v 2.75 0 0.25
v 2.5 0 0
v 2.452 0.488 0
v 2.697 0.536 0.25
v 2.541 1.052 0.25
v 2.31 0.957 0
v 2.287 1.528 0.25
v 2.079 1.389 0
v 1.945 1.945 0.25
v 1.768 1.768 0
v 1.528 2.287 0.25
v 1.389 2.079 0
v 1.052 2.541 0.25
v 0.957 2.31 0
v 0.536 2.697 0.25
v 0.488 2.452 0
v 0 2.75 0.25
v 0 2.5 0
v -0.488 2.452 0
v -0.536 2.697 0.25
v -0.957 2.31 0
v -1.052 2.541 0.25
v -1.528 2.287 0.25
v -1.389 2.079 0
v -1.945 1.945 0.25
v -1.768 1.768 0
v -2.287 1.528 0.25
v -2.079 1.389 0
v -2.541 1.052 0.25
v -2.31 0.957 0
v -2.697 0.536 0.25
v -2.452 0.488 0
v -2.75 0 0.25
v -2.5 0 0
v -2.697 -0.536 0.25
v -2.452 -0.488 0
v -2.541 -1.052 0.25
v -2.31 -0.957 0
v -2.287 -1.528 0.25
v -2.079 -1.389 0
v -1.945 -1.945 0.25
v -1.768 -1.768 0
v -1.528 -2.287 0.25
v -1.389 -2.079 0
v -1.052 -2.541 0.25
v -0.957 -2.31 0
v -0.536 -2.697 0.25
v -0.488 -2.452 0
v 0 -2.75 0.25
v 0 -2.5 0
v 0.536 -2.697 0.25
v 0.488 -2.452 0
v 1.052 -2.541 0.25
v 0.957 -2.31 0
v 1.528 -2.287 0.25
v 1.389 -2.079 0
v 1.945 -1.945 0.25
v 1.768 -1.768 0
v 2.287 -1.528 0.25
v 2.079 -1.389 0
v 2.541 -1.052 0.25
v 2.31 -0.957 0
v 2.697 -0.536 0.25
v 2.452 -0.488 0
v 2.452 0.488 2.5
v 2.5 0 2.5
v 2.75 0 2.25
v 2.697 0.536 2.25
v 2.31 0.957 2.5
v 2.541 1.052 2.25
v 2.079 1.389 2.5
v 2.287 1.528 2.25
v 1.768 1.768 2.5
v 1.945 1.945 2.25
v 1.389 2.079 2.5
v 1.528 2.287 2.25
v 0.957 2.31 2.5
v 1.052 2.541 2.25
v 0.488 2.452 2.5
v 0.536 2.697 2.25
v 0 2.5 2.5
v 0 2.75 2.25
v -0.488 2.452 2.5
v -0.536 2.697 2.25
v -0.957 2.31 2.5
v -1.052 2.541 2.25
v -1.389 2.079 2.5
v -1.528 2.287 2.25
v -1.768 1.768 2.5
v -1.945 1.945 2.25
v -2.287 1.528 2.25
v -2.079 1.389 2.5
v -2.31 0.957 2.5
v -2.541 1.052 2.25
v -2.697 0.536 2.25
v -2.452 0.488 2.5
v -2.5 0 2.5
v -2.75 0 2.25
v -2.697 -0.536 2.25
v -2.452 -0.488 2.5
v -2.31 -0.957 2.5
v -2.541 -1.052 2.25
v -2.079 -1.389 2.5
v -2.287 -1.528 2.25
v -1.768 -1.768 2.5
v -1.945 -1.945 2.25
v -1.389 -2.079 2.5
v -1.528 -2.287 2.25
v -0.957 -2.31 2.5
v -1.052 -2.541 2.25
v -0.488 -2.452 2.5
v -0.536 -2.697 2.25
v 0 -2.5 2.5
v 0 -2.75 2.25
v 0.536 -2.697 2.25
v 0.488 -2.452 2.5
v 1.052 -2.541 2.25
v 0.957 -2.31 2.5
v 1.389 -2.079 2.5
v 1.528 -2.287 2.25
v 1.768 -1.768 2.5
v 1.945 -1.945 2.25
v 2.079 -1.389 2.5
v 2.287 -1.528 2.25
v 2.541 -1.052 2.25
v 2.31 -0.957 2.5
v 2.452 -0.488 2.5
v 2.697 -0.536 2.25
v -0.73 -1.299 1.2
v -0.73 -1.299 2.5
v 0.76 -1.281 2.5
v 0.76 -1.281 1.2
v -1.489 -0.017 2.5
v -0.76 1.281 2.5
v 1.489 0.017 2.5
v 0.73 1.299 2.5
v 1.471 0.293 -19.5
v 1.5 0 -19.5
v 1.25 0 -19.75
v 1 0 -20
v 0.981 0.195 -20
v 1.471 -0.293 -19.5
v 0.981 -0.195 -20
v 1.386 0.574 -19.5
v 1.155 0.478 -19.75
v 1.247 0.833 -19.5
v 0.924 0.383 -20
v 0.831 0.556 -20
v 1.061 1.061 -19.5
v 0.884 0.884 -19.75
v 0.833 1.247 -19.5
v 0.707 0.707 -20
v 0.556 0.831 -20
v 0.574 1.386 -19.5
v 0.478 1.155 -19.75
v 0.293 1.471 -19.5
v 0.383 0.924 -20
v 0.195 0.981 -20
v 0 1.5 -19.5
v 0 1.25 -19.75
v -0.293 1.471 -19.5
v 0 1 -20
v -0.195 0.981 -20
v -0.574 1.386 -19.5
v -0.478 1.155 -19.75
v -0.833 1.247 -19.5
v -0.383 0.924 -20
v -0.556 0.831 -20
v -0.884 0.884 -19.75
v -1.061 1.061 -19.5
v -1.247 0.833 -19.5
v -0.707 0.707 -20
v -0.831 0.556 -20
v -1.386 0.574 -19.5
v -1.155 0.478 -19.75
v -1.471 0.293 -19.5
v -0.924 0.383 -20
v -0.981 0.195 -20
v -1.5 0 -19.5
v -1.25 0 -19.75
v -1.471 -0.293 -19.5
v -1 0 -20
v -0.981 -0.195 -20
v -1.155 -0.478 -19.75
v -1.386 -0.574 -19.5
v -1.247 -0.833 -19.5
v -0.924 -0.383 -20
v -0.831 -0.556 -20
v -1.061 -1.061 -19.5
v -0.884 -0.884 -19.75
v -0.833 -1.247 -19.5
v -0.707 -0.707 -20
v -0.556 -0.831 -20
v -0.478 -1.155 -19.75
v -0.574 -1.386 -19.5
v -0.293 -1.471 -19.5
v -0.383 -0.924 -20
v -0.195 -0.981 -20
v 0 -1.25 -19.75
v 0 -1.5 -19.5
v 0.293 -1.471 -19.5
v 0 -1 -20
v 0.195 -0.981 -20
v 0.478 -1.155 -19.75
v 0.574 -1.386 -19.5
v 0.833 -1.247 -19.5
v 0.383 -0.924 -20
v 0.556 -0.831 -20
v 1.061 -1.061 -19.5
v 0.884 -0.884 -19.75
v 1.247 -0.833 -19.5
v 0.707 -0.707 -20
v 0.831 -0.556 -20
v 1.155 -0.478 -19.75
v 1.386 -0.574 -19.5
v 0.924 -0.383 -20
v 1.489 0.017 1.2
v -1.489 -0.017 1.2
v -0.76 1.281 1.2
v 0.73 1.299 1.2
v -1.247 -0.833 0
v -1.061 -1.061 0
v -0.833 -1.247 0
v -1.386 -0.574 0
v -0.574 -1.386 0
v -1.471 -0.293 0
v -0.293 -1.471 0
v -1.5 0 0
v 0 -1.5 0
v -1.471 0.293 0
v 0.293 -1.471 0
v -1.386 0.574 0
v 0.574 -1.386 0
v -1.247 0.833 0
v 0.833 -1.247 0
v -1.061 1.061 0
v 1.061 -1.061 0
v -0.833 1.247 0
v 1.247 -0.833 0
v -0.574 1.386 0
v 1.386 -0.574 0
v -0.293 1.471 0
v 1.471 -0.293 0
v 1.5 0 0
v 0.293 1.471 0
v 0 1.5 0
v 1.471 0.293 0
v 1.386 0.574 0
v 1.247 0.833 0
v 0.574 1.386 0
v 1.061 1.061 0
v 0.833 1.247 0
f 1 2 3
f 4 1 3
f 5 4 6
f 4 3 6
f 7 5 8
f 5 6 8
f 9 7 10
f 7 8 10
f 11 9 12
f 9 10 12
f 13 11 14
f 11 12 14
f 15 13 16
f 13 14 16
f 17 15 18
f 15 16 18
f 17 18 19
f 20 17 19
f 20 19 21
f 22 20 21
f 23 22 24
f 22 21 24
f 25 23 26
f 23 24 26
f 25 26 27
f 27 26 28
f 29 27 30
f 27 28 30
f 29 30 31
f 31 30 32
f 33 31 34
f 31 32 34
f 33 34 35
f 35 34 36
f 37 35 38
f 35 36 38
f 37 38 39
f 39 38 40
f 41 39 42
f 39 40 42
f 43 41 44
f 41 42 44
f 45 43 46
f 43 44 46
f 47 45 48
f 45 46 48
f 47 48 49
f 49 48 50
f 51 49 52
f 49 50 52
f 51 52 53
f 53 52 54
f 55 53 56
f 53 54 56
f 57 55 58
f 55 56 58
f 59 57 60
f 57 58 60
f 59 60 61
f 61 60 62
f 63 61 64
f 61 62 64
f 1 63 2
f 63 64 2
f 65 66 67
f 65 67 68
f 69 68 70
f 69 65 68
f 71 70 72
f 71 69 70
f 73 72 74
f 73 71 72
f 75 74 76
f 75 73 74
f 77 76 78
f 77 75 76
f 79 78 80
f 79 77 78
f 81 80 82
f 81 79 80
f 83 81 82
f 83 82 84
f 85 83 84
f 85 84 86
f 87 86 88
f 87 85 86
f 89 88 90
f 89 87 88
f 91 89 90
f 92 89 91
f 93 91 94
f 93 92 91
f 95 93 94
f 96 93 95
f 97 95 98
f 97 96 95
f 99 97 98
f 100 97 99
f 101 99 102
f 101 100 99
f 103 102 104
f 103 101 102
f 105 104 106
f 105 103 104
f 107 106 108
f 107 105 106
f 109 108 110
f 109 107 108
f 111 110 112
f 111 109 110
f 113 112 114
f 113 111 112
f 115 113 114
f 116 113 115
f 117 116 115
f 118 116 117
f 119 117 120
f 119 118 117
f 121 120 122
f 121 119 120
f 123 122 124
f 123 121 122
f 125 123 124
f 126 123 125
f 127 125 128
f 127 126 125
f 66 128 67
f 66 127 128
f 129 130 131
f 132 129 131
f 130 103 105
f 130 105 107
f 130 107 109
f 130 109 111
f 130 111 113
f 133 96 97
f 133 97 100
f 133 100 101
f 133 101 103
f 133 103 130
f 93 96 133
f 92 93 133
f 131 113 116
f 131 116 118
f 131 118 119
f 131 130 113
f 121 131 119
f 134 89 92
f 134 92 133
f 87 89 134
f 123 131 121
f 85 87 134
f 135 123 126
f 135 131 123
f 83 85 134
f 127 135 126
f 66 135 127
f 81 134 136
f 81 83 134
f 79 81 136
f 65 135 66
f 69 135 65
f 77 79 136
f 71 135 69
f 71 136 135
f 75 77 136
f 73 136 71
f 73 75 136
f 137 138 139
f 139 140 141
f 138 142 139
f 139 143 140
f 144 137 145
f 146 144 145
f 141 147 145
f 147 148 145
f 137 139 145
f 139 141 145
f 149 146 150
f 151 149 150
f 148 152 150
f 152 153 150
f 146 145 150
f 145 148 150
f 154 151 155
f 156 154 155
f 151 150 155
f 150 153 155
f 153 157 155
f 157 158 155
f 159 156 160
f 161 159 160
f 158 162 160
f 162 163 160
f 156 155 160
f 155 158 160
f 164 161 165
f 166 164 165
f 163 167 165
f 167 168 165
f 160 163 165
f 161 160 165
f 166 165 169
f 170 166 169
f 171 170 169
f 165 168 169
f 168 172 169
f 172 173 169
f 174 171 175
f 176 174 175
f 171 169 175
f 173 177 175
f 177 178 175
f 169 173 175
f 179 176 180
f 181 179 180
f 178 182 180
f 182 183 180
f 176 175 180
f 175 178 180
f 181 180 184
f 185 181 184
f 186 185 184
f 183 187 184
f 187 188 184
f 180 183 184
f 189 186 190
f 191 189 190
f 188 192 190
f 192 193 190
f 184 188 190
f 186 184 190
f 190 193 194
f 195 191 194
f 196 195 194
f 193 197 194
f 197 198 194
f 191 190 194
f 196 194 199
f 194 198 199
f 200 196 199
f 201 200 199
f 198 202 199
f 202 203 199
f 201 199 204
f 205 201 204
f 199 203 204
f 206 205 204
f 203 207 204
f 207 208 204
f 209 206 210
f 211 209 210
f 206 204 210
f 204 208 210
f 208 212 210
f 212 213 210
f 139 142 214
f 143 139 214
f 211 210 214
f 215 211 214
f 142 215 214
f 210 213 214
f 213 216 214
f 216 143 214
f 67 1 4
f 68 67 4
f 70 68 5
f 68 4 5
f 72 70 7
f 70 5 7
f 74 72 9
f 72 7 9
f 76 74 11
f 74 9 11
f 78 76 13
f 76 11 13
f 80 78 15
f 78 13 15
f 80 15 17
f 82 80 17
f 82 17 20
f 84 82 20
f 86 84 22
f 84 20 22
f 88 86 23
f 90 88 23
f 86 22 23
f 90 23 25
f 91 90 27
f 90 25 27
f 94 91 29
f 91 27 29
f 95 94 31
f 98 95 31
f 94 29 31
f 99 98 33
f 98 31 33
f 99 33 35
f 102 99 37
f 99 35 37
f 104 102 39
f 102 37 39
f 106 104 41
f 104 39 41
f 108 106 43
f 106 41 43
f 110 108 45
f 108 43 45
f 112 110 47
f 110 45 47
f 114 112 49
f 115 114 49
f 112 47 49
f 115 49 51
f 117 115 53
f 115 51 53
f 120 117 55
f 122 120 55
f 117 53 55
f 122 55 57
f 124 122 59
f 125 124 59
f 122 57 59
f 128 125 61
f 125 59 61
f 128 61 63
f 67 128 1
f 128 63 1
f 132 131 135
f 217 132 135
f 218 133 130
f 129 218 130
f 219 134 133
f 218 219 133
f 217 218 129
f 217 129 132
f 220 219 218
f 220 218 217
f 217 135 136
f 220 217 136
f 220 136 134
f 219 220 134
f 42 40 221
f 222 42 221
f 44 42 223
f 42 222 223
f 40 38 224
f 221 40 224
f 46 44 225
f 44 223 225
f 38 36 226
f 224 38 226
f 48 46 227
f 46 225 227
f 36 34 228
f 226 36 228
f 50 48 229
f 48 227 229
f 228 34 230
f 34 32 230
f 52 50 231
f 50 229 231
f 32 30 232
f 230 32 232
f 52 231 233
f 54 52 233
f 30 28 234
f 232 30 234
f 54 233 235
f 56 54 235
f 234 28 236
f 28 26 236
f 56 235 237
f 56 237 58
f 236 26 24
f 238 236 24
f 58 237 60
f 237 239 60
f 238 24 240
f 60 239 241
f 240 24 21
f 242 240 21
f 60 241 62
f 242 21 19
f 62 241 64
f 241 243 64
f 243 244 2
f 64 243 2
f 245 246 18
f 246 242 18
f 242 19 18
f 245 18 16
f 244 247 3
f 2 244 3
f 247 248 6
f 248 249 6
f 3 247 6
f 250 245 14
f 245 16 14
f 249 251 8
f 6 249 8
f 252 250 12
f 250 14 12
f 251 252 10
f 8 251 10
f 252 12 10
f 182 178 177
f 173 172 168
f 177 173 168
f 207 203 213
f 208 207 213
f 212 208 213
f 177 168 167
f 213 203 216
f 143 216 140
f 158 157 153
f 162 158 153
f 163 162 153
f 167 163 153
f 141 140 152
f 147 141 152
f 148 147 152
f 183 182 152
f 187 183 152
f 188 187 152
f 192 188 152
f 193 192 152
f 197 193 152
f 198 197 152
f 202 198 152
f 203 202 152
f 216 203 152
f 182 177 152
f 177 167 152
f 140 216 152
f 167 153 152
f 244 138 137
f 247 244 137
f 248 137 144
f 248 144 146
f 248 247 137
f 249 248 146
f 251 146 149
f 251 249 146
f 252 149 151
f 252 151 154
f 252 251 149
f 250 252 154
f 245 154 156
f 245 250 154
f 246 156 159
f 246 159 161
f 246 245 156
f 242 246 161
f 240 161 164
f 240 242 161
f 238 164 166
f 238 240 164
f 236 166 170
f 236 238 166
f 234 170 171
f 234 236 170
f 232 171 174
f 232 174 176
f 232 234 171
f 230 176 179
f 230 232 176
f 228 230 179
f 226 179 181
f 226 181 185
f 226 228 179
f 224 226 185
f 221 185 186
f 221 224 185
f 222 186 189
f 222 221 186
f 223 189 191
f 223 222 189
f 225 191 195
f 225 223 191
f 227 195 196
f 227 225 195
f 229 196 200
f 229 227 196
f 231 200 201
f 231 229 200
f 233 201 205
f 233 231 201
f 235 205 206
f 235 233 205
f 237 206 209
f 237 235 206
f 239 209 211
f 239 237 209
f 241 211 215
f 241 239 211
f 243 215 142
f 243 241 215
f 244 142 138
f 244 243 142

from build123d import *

# Parameters (mm, degrees)
F0_R     = 1.5
F1_DEPTH = 20
F2_SIZE  = 0.5
F0_R_2   = 2.75
F3_DEPTH = 2.5
F4_SIZE  = 0.25
F6_DEPTH = 1.3


with BuildPart() as f1:
    # F0 (on Top) → F1 (new body)
    with BuildSketch(Plane.XY):
        Circle(F0_R)
    extrude(amount=-F1_DEPTH)

    # F2
    f2_edges = [f1.edges().sort_by_distance(p)[0] for p in [
        (-1.5, 0, -20),
    ]]
    chamfer(f2_edges, length=F2_SIZE)

    # F0 (on Top) → F3 (join)
    with BuildSketch(Plane.XY):
        Circle(F0_R_2)
        Circle(F0_R, mode=Mode.SUBTRACT)
        Circle(F0_R)
    extrude(amount=F3_DEPTH)

    # F4
    f4_edges = [f1.edges().sort_by_distance(p)[0] for p in [
        (-2.75, 0, 2.5),
        (-2.75, 0, 0),
    ]]
    chamfer(f4_edges, length=F4_SIZE)

    # F5 (on face) → F6 (cut)
    with BuildSketch(Plane.XY.offset(2.5)):
        Polygon((0.75963, -1.281313), (1.489464, 0.017202), (0.729835, 1.298515), (-0.75963, 1.281313), (-1.489464, -0.017202), (-0.729835, -1.298515), align=None)
    extrude(amount=-F6_DEPTH, mode=Mode.SUBTRACT)


solid = f1.part
